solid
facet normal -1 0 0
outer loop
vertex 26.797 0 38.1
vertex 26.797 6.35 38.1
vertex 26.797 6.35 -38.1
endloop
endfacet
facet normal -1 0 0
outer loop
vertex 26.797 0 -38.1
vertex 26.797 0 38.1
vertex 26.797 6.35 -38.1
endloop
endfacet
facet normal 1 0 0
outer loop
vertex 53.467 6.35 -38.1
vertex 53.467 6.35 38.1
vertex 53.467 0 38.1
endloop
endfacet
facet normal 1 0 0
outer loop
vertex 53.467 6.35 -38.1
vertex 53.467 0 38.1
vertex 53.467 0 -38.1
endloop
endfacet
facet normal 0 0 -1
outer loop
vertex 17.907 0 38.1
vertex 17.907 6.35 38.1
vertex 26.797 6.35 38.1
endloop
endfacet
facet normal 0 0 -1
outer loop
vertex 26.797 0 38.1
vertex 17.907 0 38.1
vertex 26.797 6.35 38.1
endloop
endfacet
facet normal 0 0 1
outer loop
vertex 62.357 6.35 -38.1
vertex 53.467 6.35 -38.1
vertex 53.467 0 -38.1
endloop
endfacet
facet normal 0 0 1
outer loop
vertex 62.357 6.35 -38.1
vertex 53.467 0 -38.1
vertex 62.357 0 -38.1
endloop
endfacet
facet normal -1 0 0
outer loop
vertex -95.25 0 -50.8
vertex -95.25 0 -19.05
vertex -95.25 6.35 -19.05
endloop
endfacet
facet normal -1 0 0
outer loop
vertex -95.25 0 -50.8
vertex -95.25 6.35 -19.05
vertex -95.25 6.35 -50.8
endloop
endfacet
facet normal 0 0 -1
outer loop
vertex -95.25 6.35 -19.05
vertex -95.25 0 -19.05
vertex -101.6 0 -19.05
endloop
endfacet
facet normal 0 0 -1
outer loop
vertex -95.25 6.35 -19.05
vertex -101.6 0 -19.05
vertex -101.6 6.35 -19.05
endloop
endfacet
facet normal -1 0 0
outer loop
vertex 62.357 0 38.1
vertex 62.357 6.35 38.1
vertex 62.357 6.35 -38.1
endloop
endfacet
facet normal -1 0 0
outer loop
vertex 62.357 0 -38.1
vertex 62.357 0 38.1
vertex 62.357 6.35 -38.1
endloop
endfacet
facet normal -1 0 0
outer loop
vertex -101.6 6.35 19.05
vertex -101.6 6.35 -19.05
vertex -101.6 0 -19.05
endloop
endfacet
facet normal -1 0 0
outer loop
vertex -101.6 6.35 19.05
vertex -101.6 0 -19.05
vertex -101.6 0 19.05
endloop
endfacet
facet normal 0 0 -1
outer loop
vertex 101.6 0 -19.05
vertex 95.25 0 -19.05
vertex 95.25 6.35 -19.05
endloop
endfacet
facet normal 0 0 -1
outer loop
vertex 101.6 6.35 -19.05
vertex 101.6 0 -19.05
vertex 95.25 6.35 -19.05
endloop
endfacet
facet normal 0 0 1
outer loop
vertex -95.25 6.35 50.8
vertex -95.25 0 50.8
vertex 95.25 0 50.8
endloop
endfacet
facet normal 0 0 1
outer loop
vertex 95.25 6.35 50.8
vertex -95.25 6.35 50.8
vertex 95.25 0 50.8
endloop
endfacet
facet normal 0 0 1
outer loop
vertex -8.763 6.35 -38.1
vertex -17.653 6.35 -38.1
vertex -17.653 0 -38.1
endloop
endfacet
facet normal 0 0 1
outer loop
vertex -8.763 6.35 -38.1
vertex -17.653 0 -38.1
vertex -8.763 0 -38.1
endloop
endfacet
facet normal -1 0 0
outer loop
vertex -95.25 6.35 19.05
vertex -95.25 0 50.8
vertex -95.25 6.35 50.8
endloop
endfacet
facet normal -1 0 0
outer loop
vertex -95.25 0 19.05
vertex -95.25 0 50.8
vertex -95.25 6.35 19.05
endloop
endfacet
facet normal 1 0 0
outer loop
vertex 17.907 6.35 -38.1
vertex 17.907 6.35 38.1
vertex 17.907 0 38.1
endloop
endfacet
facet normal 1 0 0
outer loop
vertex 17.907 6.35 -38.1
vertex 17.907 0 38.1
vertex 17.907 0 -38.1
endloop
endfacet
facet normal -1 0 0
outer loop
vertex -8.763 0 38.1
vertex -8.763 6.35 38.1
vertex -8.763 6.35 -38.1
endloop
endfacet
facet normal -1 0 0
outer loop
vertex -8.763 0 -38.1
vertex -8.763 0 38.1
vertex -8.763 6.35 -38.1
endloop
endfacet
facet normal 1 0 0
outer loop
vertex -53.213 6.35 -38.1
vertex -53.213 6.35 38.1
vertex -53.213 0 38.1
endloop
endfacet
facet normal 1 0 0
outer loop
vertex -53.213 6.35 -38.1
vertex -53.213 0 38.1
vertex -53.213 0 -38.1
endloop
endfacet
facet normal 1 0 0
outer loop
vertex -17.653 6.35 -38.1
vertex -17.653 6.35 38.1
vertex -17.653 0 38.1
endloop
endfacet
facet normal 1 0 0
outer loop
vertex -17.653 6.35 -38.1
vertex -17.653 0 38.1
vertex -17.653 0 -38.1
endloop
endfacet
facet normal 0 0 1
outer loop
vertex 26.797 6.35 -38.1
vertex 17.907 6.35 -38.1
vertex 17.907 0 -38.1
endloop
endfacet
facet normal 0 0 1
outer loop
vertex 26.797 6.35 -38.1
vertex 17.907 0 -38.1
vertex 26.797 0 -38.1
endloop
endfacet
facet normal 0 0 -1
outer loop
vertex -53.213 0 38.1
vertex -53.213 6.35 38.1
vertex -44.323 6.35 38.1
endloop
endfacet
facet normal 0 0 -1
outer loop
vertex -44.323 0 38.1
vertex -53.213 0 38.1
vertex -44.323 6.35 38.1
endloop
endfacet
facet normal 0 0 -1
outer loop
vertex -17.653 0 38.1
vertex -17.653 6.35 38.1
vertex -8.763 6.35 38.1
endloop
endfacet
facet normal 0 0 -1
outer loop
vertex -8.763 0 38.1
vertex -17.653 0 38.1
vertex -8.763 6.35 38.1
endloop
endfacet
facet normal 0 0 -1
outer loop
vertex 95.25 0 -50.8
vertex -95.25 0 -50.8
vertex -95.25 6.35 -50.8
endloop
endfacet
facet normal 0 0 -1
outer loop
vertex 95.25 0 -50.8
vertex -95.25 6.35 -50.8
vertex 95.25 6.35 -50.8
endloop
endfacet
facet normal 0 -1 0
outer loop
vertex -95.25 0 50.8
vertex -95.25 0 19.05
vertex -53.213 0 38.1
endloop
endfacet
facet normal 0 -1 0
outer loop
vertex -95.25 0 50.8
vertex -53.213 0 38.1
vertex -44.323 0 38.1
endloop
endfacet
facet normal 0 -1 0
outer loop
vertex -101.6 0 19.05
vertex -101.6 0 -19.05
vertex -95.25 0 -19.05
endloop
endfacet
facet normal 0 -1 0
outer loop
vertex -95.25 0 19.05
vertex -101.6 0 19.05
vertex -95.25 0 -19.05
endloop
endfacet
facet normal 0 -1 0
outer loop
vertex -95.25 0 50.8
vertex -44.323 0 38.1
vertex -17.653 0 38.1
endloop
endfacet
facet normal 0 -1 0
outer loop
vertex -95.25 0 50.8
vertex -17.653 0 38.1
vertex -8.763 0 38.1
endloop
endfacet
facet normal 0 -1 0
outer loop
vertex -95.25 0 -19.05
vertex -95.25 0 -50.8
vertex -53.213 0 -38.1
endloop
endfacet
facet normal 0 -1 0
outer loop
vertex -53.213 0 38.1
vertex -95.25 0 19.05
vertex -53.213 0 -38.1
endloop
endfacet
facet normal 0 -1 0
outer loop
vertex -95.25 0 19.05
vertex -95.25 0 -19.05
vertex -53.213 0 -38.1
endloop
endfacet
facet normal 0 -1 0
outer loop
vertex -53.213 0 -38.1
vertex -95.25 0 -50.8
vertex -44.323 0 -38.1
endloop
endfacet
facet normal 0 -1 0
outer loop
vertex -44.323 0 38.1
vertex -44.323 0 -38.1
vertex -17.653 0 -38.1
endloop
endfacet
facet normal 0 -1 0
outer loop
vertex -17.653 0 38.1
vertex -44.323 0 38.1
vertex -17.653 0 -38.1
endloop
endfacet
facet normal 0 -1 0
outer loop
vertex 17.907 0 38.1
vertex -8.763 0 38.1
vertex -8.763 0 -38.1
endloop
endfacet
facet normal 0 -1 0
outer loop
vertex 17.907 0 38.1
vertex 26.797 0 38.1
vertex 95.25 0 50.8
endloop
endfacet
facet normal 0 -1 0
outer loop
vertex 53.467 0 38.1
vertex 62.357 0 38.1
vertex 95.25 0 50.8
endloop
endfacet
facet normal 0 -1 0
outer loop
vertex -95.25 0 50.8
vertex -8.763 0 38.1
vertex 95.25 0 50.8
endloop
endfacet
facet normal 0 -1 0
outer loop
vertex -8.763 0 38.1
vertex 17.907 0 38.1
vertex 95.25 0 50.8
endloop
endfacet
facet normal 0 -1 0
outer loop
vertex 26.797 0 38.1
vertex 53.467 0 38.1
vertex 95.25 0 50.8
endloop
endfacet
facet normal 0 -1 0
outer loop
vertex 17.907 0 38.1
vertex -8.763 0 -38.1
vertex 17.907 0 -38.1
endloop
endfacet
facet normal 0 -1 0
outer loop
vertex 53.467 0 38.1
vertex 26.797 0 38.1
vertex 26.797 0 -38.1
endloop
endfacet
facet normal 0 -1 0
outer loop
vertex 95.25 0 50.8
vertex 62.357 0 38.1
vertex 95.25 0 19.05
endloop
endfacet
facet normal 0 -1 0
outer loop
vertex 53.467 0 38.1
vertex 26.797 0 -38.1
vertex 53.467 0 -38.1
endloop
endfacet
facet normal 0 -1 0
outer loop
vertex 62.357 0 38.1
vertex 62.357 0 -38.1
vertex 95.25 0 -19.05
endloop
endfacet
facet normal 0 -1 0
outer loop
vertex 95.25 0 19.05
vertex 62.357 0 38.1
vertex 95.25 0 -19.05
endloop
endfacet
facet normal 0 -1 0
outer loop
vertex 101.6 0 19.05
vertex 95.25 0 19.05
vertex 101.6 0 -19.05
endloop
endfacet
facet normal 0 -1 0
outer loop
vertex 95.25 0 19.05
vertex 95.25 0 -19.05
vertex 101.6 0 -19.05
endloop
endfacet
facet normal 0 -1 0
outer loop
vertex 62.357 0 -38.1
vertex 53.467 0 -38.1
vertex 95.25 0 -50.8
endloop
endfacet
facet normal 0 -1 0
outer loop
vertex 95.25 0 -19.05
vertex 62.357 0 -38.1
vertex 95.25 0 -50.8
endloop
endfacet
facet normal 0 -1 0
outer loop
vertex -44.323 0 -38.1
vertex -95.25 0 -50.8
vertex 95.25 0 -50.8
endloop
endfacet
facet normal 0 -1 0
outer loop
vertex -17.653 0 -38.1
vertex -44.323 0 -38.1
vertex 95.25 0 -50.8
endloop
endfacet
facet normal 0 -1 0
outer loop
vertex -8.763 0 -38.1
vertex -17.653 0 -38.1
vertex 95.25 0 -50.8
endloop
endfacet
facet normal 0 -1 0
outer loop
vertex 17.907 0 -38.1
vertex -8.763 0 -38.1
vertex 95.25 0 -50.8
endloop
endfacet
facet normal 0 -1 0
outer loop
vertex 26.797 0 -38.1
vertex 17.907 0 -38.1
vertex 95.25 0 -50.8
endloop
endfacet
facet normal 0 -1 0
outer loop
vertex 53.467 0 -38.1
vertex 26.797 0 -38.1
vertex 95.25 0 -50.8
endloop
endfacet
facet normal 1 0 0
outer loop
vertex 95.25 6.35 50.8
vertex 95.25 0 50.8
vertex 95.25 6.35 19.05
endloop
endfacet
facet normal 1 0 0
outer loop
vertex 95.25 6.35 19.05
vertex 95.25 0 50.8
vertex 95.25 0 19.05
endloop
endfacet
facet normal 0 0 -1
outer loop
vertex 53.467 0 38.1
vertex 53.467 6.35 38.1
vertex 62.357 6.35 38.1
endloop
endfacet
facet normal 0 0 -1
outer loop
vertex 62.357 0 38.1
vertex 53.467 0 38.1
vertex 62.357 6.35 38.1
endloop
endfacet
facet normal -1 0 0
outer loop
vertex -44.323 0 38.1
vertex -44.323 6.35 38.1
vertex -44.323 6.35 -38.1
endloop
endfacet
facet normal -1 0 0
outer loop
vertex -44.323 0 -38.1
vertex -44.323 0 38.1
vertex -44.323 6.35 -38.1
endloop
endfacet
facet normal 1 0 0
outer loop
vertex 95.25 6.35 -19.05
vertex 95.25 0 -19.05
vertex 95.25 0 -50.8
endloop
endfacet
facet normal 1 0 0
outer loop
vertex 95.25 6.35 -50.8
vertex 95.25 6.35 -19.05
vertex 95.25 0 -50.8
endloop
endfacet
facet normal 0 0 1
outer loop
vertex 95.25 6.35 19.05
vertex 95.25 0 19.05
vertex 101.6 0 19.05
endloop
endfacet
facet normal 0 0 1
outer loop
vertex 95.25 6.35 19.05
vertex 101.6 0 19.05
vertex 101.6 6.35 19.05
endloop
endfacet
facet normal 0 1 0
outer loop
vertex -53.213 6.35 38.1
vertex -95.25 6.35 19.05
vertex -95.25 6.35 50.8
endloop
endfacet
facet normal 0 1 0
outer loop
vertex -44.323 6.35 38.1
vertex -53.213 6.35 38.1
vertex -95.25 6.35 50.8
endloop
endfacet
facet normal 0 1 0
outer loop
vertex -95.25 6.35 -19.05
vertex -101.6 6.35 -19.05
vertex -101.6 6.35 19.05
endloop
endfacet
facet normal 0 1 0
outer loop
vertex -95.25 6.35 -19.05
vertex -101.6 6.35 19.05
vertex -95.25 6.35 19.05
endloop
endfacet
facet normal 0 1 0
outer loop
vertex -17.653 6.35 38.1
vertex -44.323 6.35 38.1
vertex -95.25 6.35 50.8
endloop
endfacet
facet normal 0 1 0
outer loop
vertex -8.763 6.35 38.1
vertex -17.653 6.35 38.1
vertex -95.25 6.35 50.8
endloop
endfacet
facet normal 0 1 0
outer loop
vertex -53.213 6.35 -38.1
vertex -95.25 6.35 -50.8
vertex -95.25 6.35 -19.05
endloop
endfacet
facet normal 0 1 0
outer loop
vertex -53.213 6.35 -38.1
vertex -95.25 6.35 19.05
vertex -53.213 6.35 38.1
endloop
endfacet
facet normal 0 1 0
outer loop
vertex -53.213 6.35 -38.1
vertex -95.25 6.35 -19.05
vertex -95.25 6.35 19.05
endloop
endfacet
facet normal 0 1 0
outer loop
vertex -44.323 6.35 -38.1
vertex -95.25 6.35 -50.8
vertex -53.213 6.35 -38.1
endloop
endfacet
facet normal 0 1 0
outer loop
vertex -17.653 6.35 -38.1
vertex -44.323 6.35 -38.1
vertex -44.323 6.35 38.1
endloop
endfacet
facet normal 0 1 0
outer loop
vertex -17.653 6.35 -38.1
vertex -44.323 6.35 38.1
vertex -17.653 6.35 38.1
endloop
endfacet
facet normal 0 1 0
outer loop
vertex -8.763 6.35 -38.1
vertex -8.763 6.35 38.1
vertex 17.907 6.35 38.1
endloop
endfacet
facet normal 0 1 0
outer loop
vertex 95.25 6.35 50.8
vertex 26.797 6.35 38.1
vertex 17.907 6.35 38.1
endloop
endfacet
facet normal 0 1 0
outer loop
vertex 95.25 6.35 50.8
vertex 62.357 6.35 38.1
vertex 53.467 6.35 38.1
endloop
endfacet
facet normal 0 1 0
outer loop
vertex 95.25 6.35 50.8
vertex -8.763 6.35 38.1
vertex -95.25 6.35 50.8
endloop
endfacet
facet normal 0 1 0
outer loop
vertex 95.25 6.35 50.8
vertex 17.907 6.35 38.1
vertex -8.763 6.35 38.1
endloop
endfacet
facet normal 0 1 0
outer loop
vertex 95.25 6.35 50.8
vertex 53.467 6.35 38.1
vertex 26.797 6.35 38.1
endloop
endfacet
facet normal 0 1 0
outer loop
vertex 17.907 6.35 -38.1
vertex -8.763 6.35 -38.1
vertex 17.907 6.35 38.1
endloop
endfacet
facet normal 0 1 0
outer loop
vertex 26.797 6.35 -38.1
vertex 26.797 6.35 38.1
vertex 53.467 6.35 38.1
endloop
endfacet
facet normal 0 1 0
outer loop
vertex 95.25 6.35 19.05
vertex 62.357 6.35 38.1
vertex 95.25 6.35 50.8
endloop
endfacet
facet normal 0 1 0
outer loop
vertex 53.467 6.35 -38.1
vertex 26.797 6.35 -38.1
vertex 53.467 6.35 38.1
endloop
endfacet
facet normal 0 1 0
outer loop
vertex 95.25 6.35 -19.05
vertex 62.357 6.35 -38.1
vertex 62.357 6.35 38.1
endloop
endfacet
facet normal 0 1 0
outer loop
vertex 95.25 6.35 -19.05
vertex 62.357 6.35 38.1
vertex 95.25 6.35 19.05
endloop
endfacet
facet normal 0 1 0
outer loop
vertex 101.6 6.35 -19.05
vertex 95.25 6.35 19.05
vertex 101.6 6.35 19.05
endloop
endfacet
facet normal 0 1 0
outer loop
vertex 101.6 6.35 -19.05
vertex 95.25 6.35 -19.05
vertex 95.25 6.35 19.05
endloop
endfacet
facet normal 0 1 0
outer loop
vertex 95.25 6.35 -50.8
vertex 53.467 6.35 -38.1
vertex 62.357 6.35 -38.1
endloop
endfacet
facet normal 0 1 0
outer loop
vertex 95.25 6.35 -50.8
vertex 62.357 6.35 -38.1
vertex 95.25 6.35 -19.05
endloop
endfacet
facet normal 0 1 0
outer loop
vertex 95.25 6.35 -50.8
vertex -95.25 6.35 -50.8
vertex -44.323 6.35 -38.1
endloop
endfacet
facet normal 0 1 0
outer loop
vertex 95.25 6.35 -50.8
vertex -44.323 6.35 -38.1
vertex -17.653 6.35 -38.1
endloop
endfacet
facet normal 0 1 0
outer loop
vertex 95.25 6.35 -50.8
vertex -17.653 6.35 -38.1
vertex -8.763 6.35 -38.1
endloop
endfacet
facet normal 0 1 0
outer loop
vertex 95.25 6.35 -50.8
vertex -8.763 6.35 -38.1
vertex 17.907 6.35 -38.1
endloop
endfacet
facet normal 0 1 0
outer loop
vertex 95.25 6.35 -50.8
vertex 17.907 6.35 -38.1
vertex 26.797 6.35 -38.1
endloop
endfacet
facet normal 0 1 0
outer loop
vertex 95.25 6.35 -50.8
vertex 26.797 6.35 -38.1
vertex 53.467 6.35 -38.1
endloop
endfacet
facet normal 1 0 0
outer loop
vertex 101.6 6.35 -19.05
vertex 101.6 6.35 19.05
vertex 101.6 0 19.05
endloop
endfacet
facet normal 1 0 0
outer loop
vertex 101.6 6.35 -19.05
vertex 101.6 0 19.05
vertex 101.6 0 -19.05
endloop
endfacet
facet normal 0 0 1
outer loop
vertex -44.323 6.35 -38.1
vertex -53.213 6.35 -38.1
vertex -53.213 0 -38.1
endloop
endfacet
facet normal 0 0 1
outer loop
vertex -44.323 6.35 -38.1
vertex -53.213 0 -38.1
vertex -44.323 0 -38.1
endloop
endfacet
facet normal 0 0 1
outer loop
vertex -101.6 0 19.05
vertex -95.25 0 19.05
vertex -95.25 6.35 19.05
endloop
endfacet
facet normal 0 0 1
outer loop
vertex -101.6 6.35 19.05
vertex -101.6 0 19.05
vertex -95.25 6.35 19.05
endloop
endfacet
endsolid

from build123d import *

# Parameters (mm, degrees)
SKETCH1_W           = 190.5
SKETCH1_H           = 101.6
BOSS_EXTRUDE1_DEPTH = 6.35
SKETCH2_W           = 8.89
SKETCH2_H           = 76.2
HOLE_DEPTH          = 6.35
SKETCH3_W           = 38.1
SKETCH3_H           = 6.35
TAB1_DEPTH          = 6.35
SKETCH4_W           = 38.1
SKETCH4_H           = 6.35
TAB2_DEPTH          = 6.35


with BuildPart() as part:
    # Sketch1 → Boss-Extrude1 (new body)
    with BuildSketch(Plane(origin=(0, 0, 0), x_dir=(1, 0, 0), z_dir=(0, 1, 0))):
        Rectangle(SKETCH1_W, SKETCH1_H)
    extrude(amount=BOSS_EXTRUDE1_DEPTH)

    # Sketch2 → hole (cut)
    with BuildSketch(Plane(origin=(0, 6.35, 0), x_dir=(1, 0, 0), z_dir=(0, 1, 0))):
        with Locations((-48.768, 0)):
            Rectangle(SKETCH2_W, SKETCH2_H)
        with Locations((-13.208, 0)):
            Rectangle(SKETCH2_W, SKETCH2_H)
        with Locations((22.352, 0)):
            Rectangle(SKETCH2_W, SKETCH2_H)
        with Locations((57.912, 0)):
            Rectangle(SKETCH2_W, SKETCH2_H)
    extrude(amount=-HOLE_DEPTH, mode=Mode.SUBTRACT)

    # Sketch3 → tab1 (add)
    with BuildSketch(Plane.ZY.offset(95.25)):
        with Locations((0, 3.175)):
            Rectangle(SKETCH3_W, SKETCH3_H)
    extrude(amount=TAB1_DEPTH)

    # Sketch4 → tab2 (add)
    with BuildSketch(Plane(origin=(95.25, 0, 0), x_dir=(0, 0, -1), z_dir=(1, 0, 0))):
        with Locations((0, 3.175)):
            Rectangle(SKETCH4_W, SKETCH4_H)
    extrude(amount=TAB2_DEPTH)


solid = part.part
